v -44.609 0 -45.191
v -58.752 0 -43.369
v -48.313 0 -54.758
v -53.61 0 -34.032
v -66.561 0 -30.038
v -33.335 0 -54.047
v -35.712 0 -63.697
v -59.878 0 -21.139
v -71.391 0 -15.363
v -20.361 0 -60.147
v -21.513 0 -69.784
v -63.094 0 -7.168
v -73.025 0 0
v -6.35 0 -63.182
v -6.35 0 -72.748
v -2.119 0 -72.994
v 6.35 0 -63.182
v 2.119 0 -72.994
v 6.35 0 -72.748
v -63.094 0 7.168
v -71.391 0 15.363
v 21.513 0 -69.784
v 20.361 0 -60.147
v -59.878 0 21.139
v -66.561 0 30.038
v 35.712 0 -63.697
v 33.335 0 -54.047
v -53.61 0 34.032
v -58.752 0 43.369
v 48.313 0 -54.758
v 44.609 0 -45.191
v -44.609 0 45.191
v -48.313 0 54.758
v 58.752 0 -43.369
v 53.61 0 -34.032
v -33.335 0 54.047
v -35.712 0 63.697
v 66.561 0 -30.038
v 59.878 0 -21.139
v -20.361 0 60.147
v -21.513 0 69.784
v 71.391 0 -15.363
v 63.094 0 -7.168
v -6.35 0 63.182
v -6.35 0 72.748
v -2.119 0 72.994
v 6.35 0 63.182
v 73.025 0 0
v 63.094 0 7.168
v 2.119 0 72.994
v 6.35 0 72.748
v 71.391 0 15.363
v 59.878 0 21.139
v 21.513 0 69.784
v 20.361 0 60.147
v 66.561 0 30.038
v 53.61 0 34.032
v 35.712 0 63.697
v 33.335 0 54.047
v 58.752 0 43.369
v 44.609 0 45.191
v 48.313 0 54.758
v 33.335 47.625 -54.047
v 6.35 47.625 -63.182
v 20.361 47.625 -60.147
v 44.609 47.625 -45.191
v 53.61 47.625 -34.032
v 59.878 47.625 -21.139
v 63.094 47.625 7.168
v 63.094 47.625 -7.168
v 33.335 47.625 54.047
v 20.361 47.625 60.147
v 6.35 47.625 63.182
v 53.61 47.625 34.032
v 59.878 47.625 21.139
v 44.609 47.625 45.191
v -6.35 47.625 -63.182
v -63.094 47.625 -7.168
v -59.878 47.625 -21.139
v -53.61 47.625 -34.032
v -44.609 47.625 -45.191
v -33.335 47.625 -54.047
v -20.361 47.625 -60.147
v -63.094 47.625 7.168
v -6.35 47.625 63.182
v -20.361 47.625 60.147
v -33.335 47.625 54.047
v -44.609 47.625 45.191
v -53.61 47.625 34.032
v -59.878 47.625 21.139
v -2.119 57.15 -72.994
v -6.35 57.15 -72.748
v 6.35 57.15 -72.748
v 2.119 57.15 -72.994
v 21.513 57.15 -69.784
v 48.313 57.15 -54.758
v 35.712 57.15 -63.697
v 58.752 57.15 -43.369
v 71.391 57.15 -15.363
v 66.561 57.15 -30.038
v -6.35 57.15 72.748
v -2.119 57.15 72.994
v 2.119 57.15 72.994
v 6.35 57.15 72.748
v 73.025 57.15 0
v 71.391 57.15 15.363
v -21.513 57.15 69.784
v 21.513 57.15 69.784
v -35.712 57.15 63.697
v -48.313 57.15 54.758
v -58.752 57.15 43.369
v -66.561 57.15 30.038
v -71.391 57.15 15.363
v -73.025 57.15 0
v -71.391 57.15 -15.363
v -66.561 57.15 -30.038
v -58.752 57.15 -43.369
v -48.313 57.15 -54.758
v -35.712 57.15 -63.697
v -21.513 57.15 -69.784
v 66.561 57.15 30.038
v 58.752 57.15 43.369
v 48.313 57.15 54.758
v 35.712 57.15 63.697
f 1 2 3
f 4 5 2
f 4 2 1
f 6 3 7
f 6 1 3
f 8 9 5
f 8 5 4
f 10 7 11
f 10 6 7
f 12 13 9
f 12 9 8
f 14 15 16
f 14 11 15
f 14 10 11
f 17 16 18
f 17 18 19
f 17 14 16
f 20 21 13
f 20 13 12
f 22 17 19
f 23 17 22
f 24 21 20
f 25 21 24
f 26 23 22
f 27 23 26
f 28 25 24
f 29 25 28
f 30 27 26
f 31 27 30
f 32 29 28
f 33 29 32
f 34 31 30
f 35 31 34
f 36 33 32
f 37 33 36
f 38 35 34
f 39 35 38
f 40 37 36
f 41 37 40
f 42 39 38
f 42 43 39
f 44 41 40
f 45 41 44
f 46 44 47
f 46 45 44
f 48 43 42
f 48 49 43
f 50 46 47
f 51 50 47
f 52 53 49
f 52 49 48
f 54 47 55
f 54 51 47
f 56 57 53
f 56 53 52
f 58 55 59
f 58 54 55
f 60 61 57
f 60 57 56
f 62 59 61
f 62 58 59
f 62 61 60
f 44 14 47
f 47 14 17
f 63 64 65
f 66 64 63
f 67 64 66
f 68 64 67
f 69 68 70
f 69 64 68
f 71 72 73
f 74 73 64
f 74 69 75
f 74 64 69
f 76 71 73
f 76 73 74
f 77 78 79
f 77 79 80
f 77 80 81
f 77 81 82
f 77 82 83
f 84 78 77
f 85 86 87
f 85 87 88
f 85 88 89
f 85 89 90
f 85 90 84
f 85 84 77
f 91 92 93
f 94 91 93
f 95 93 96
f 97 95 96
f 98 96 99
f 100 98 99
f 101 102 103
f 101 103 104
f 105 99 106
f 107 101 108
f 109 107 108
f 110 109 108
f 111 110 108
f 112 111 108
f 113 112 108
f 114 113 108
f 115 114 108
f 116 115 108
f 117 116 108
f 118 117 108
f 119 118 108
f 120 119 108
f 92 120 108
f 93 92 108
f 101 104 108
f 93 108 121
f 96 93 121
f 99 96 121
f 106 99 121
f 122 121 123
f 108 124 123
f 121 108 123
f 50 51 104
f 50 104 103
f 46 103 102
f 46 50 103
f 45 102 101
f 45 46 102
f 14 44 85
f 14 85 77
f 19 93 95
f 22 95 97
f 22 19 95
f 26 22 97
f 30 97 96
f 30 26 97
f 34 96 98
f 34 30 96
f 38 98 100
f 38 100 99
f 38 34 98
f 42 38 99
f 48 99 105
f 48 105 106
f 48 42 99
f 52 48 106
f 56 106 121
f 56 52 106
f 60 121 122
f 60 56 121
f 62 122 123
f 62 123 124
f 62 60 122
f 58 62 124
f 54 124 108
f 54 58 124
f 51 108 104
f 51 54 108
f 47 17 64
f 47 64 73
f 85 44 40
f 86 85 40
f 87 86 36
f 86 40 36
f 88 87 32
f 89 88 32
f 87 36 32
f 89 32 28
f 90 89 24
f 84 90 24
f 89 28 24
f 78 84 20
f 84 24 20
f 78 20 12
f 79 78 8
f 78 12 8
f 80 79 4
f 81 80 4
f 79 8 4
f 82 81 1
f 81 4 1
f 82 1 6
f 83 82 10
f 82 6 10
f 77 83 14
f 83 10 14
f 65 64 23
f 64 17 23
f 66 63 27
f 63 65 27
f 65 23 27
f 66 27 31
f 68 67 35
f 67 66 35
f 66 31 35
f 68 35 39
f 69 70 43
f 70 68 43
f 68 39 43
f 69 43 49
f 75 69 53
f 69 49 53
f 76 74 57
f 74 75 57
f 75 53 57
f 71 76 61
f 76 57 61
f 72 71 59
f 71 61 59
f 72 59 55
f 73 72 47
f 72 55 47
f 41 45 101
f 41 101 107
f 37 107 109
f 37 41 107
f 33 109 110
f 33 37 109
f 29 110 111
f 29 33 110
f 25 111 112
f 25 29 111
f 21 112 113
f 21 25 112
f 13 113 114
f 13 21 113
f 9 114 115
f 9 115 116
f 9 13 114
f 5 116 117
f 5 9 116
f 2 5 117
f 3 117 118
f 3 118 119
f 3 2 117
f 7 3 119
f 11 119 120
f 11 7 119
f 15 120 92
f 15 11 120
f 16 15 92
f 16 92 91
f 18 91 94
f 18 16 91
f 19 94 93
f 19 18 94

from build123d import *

# Parameters (mm, degrees)
F2_DEPTH = 57.15
F1_R     = 63.5
F3_DEPTH = 47.625
F4_DEPTH = 47.625


with BuildPart() as f2:
    # F0 (on Front) → F2 (new body)
    with BuildSketch(Plane.XZ):
        with BuildLine():
            Line((-6.35, 0), (-6.35, 72.7483891574))
            ThreePointArc((-6.35, 72.7483891574), (-73.025, 0), (-6.35, -72.7483891574))
            Line((-6.35, -72.7483891574), (-6.35, 0))
        make_face()
        with BuildLine():
            ThreePointArc((6.35, -72.7483891574), (53.8347442411, -49.3403581006), (73.025, 0))
            ThreePointArc((73.025, 0), (53.8347442411, 49.3403581006), (6.35, 72.7483891574))
            Line((6.35, 72.7483891574), (6.35, 0))
            Line((6.35, 0), (6.35, -72.7483891574))
        make_face()
        with BuildLine():
            Line((6.35, 0), (6.35, 72.7483891574))
            ThreePointArc((6.35, 72.7483891574), (0, 73.025), (-6.35, 72.7483891574))
            Line((-6.35, 72.7483891574), (-6.35, 0))
            Line((-6.35, 0), (0, 0))
            Line((0, 0), (6.35, 0))
        make_face()
        with BuildLine():
            ThreePointArc((-6.35, -72.7483891574), (0, -73.025), (6.35, -72.7483891574))
            Line((6.35, -72.7483891574), (6.35, 0))
            Line((6.35, 0), (0, 0))
            Line((0, 0), (-6.35, 0))
            Line((-6.35, 0), (-6.35, -72.7483891574))
        make_face()
    extrude(amount=-F2_DEPTH)

    # F1 (on Front) → F3 (cut)
    with BuildSketch(Plane.XZ):
        Circle(F1_R)
    extrude(amount=-F3_DEPTH, mode=Mode.SUBTRACT)

    # F0 (on Front) → F4 (join)
    with BuildSketch(Plane.XZ):
        with BuildLine():
            ThreePointArc((-6.35, -72.7483891574), (0, -73.025), (6.35, -72.7483891574))
            Line((6.35, -72.7483891574), (6.35, 0))
            Line((6.35, 0), (0, 0))
            Line((0, 0), (-6.35, 0))
            Line((-6.35, 0), (-6.35, -72.7483891574))
        make_face()
        with BuildLine():
            Line((6.35, 0), (6.35, 72.7483891574))
            ThreePointArc((6.35, 72.7483891574), (0, 73.025), (-6.35, 72.7483891574))
            Line((-6.35, 72.7483891574), (-6.35, 0))
            Line((-6.35, 0), (0, 0))
            Line((0, 0), (6.35, 0))
        make_face()
    extrude(amount=-F4_DEPTH)


solid = f2.part
